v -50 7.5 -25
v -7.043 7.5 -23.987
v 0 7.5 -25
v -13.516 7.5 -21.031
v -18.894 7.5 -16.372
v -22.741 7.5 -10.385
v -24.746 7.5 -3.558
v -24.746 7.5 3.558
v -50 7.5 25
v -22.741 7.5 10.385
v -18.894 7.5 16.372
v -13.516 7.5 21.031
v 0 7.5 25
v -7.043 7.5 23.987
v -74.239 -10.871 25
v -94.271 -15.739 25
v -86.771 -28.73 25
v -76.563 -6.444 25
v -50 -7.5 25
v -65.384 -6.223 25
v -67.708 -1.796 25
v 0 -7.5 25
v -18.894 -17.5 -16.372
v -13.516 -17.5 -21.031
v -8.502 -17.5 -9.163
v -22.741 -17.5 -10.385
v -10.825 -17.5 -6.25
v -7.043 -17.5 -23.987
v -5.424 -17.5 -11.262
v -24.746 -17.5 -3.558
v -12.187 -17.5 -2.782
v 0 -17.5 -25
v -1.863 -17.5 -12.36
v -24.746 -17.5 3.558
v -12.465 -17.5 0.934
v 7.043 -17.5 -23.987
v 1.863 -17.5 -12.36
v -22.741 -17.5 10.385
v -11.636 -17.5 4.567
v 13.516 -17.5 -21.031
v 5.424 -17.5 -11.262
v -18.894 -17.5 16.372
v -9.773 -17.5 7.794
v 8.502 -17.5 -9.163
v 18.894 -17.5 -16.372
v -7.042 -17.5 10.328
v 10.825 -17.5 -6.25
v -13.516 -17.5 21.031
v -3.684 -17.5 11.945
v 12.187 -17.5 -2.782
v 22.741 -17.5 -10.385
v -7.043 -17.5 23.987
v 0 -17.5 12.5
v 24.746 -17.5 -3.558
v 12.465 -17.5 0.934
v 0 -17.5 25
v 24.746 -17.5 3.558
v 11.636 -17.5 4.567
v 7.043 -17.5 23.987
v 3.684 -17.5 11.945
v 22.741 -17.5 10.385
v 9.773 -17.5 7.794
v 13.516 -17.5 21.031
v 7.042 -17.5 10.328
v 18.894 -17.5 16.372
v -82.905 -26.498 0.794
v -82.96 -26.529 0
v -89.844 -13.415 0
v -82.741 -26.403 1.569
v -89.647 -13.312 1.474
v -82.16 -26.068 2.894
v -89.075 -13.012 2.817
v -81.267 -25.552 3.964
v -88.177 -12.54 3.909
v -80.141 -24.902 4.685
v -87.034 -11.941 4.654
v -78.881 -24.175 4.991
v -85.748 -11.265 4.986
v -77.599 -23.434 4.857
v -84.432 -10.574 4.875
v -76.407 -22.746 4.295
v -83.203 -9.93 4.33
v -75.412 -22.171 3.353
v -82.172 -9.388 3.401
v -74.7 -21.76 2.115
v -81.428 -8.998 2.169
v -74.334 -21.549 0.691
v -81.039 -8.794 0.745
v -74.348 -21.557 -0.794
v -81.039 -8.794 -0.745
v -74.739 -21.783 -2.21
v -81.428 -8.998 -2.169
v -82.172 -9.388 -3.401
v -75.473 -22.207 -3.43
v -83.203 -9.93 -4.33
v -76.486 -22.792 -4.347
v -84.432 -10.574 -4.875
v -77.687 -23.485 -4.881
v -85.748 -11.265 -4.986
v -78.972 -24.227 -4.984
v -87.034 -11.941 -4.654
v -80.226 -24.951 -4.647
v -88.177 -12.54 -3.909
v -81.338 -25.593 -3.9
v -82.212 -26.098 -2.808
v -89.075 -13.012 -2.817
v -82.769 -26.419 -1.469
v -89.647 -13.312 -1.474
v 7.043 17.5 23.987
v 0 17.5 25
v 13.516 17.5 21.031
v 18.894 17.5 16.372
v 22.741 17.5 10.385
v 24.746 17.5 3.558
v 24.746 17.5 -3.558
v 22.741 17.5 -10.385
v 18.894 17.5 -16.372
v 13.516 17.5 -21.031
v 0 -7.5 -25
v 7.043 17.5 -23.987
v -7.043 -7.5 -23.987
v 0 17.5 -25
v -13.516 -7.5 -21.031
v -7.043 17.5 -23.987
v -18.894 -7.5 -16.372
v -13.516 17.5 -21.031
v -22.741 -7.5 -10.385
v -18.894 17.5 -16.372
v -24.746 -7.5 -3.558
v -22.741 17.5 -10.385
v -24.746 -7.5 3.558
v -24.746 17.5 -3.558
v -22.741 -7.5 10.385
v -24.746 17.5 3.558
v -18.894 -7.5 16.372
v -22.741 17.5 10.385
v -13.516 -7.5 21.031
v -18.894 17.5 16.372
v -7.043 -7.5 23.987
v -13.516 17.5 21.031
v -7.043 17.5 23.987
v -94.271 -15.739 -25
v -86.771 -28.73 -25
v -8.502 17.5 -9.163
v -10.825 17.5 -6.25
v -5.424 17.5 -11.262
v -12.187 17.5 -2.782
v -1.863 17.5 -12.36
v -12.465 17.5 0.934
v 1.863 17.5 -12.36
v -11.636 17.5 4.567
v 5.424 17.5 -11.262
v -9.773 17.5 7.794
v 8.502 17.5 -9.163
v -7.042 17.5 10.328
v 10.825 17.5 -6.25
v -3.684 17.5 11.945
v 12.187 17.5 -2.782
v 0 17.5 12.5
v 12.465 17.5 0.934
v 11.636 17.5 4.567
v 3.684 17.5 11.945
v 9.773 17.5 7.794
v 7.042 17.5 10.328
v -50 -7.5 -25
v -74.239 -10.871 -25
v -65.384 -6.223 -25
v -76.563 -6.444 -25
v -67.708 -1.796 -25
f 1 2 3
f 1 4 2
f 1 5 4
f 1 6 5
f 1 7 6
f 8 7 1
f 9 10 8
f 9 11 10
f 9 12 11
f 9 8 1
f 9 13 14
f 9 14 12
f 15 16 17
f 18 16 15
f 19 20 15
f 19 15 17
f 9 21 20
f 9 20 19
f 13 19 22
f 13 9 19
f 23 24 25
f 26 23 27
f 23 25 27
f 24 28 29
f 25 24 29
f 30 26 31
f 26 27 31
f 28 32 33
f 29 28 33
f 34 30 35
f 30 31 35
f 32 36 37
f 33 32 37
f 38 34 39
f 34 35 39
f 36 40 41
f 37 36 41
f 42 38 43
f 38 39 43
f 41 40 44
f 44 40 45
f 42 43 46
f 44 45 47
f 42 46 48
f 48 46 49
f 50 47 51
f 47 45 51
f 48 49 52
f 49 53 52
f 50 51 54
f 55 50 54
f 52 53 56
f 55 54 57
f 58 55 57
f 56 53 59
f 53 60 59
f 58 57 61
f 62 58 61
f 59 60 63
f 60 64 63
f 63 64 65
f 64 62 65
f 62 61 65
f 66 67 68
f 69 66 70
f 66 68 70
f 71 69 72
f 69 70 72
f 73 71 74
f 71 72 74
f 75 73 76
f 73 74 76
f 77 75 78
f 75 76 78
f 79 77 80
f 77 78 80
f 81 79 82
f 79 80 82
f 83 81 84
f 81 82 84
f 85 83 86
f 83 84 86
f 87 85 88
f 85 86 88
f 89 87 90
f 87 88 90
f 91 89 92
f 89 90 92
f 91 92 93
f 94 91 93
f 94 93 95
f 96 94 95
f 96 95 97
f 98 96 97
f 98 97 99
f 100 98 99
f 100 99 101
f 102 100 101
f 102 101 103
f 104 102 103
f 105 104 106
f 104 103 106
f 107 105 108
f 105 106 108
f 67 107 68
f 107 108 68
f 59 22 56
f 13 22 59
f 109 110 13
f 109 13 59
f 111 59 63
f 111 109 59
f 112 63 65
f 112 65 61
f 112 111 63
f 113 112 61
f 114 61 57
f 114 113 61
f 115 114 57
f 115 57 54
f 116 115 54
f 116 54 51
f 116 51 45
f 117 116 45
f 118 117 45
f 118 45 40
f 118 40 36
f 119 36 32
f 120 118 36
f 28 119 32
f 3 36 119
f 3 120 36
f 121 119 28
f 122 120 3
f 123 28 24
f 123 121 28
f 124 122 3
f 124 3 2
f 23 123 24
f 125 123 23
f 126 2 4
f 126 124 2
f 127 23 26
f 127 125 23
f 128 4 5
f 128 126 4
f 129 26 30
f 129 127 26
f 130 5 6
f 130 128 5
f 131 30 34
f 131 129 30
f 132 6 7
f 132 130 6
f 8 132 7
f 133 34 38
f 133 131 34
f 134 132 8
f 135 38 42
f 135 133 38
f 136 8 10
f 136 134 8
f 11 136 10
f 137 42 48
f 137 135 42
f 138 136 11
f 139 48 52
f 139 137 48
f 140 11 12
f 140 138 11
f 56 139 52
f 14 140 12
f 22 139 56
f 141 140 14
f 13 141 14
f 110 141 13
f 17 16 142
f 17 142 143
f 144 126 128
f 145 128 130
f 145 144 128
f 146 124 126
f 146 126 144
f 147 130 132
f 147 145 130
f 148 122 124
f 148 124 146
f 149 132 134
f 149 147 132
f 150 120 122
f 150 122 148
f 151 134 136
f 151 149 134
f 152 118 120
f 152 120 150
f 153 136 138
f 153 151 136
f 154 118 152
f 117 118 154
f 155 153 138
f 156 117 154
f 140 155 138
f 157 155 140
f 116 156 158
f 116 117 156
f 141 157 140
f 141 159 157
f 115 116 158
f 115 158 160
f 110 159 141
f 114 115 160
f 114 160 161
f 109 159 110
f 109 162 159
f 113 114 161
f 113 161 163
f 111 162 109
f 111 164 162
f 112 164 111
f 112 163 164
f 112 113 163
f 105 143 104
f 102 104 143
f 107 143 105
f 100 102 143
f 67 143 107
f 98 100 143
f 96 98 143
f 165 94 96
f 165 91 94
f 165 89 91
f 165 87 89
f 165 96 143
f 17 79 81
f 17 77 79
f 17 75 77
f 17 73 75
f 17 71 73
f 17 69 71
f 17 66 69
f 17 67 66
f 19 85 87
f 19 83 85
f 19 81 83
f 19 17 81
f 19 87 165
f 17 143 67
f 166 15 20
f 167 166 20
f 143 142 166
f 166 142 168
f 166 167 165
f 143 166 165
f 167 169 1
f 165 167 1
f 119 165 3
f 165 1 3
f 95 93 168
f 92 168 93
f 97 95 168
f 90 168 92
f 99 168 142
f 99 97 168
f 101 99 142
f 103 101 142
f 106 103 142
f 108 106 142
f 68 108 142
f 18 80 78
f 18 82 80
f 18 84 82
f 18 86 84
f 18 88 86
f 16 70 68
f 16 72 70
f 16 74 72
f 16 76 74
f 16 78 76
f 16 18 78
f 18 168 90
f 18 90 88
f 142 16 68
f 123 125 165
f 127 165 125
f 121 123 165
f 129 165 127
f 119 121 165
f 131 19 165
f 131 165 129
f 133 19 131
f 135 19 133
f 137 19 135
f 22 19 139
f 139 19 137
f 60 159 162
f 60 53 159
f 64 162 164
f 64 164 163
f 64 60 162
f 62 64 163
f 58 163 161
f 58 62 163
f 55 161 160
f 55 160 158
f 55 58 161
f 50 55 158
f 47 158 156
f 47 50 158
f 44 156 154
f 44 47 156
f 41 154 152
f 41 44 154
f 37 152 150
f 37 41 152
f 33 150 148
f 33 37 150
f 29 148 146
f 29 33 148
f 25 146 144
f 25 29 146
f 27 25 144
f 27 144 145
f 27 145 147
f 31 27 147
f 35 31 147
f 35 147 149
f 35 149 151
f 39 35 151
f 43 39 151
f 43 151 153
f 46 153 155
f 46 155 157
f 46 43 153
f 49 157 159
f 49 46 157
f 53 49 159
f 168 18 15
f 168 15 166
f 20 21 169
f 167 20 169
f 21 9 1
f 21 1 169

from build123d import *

# Parameters (mm, degrees)
SKETCH1_R           = 25
SKETCH1_R_2         = 12.5
BOSS_EXTRUDE1_DEPTH = 17.5
BOSS_EXTRUDE2_DEPTH = 25
CUT_EXTRUDE1_START  = -50
SKETCH3_R           = 12.5
CUT_EXTRUDE1_DEPTH  = 50
BOSS_EXTRUDE3_DEPTH = 25
SKETCH5_W           = 10
SKETCH5_H           = 75.978198428
CUT_EXTRUDE2_DEPTH  = 5
SKETCH6_R           = 5
CUT_EXTRUDE3_DEPTH  = 101.657736852


with BuildPart() as part:
    # Sketch1 → Boss-Extrude1 (new, symmetric)
    with BuildSketch(Plane(origin=(0, 0, 0), x_dir=(1, 0, 0), z_dir=(0, 1, 0))):
        with Locations(Location((0, 0, 0), (0, 0, 270))):
            Circle(SKETCH1_R)
        with Locations(Location((0, 0, 0), (0, 0, 270))):
            Circle(SKETCH1_R_2, mode=Mode.SUBTRACT)
    extrude(amount=BOSS_EXTRUDE1_DEPTH, both=True)

    # Sketch2 → Boss-Extrude2 (add, symmetric)
    with BuildSketch(Plane.XY):
        Polygon((-15, 7.5), (-50, 7.5), (-50, -7.5), (-15, -7.5), (0, -7.5), (0, 7.5), align=None)
    extrude(amount=BOSS_EXTRUDE2_DEPTH, both=True)

    # Sketch3 → Cut-Extrude1 (cut)
    with BuildSketch(Plane(origin=(0, 17.5, 0), x_dir=(1, 0, 0), z_dir=(0, 1, 0)).offset(CUT_EXTRUDE1_START)):
        with Locations(Location((0, 0, 0), (0, 0, 270))):
            Circle(SKETCH3_R)
    extrude(amount=CUT_EXTRUDE1_DEPTH, mode=Mode.SUBTRACT)

    # Sketch4 → Boss-Extrude3 (add, symmetric)
    with BuildSketch(Plane.XY):
        Polygon((-50, 7.5), (-94.271090497, -15.73941794), (-86.771090497, -28.729798997), (-50, -7.5), align=None)
    extrude(amount=BOSS_EXTRUDE3_DEPTH, both=True)

    # Sketch5 → Cut-Extrude2 (cut)
    with BuildSketch(Plane(origin=(-13.887914048, 26.456475856, 0), x_dir=(0.8854218099422688, 0.4647883588027534, 0), z_dir=(-0.4647883588027534, 0.8854218099422688, 0))):
        with Locations((-65.785177806, 0)):
            Rectangle(SKETCH5_W, SKETCH5_H)
    extrude(amount=-CUT_EXTRUDE2_DEPTH, mode=Mode.SUBTRACT)

    # Sketch6 → Cut-Extrude3 (cut, through all)
    with BuildSketch(Plane(origin=(-13.887914048, 26.456475856, 0), x_dir=(0.8854218099422688, 0.4647883588027534, 0), z_dir=(-0.4647883588027534, 0.8854218099422688, 0))):
        with Locations(Location((-80.785177806, 0, 0), (0, 0, 180))):
            Circle(SKETCH6_R)
    extrude(amount=-CUT_EXTRUDE3_DEPTH, mode=Mode.SUBTRACT)


solid = part.part
